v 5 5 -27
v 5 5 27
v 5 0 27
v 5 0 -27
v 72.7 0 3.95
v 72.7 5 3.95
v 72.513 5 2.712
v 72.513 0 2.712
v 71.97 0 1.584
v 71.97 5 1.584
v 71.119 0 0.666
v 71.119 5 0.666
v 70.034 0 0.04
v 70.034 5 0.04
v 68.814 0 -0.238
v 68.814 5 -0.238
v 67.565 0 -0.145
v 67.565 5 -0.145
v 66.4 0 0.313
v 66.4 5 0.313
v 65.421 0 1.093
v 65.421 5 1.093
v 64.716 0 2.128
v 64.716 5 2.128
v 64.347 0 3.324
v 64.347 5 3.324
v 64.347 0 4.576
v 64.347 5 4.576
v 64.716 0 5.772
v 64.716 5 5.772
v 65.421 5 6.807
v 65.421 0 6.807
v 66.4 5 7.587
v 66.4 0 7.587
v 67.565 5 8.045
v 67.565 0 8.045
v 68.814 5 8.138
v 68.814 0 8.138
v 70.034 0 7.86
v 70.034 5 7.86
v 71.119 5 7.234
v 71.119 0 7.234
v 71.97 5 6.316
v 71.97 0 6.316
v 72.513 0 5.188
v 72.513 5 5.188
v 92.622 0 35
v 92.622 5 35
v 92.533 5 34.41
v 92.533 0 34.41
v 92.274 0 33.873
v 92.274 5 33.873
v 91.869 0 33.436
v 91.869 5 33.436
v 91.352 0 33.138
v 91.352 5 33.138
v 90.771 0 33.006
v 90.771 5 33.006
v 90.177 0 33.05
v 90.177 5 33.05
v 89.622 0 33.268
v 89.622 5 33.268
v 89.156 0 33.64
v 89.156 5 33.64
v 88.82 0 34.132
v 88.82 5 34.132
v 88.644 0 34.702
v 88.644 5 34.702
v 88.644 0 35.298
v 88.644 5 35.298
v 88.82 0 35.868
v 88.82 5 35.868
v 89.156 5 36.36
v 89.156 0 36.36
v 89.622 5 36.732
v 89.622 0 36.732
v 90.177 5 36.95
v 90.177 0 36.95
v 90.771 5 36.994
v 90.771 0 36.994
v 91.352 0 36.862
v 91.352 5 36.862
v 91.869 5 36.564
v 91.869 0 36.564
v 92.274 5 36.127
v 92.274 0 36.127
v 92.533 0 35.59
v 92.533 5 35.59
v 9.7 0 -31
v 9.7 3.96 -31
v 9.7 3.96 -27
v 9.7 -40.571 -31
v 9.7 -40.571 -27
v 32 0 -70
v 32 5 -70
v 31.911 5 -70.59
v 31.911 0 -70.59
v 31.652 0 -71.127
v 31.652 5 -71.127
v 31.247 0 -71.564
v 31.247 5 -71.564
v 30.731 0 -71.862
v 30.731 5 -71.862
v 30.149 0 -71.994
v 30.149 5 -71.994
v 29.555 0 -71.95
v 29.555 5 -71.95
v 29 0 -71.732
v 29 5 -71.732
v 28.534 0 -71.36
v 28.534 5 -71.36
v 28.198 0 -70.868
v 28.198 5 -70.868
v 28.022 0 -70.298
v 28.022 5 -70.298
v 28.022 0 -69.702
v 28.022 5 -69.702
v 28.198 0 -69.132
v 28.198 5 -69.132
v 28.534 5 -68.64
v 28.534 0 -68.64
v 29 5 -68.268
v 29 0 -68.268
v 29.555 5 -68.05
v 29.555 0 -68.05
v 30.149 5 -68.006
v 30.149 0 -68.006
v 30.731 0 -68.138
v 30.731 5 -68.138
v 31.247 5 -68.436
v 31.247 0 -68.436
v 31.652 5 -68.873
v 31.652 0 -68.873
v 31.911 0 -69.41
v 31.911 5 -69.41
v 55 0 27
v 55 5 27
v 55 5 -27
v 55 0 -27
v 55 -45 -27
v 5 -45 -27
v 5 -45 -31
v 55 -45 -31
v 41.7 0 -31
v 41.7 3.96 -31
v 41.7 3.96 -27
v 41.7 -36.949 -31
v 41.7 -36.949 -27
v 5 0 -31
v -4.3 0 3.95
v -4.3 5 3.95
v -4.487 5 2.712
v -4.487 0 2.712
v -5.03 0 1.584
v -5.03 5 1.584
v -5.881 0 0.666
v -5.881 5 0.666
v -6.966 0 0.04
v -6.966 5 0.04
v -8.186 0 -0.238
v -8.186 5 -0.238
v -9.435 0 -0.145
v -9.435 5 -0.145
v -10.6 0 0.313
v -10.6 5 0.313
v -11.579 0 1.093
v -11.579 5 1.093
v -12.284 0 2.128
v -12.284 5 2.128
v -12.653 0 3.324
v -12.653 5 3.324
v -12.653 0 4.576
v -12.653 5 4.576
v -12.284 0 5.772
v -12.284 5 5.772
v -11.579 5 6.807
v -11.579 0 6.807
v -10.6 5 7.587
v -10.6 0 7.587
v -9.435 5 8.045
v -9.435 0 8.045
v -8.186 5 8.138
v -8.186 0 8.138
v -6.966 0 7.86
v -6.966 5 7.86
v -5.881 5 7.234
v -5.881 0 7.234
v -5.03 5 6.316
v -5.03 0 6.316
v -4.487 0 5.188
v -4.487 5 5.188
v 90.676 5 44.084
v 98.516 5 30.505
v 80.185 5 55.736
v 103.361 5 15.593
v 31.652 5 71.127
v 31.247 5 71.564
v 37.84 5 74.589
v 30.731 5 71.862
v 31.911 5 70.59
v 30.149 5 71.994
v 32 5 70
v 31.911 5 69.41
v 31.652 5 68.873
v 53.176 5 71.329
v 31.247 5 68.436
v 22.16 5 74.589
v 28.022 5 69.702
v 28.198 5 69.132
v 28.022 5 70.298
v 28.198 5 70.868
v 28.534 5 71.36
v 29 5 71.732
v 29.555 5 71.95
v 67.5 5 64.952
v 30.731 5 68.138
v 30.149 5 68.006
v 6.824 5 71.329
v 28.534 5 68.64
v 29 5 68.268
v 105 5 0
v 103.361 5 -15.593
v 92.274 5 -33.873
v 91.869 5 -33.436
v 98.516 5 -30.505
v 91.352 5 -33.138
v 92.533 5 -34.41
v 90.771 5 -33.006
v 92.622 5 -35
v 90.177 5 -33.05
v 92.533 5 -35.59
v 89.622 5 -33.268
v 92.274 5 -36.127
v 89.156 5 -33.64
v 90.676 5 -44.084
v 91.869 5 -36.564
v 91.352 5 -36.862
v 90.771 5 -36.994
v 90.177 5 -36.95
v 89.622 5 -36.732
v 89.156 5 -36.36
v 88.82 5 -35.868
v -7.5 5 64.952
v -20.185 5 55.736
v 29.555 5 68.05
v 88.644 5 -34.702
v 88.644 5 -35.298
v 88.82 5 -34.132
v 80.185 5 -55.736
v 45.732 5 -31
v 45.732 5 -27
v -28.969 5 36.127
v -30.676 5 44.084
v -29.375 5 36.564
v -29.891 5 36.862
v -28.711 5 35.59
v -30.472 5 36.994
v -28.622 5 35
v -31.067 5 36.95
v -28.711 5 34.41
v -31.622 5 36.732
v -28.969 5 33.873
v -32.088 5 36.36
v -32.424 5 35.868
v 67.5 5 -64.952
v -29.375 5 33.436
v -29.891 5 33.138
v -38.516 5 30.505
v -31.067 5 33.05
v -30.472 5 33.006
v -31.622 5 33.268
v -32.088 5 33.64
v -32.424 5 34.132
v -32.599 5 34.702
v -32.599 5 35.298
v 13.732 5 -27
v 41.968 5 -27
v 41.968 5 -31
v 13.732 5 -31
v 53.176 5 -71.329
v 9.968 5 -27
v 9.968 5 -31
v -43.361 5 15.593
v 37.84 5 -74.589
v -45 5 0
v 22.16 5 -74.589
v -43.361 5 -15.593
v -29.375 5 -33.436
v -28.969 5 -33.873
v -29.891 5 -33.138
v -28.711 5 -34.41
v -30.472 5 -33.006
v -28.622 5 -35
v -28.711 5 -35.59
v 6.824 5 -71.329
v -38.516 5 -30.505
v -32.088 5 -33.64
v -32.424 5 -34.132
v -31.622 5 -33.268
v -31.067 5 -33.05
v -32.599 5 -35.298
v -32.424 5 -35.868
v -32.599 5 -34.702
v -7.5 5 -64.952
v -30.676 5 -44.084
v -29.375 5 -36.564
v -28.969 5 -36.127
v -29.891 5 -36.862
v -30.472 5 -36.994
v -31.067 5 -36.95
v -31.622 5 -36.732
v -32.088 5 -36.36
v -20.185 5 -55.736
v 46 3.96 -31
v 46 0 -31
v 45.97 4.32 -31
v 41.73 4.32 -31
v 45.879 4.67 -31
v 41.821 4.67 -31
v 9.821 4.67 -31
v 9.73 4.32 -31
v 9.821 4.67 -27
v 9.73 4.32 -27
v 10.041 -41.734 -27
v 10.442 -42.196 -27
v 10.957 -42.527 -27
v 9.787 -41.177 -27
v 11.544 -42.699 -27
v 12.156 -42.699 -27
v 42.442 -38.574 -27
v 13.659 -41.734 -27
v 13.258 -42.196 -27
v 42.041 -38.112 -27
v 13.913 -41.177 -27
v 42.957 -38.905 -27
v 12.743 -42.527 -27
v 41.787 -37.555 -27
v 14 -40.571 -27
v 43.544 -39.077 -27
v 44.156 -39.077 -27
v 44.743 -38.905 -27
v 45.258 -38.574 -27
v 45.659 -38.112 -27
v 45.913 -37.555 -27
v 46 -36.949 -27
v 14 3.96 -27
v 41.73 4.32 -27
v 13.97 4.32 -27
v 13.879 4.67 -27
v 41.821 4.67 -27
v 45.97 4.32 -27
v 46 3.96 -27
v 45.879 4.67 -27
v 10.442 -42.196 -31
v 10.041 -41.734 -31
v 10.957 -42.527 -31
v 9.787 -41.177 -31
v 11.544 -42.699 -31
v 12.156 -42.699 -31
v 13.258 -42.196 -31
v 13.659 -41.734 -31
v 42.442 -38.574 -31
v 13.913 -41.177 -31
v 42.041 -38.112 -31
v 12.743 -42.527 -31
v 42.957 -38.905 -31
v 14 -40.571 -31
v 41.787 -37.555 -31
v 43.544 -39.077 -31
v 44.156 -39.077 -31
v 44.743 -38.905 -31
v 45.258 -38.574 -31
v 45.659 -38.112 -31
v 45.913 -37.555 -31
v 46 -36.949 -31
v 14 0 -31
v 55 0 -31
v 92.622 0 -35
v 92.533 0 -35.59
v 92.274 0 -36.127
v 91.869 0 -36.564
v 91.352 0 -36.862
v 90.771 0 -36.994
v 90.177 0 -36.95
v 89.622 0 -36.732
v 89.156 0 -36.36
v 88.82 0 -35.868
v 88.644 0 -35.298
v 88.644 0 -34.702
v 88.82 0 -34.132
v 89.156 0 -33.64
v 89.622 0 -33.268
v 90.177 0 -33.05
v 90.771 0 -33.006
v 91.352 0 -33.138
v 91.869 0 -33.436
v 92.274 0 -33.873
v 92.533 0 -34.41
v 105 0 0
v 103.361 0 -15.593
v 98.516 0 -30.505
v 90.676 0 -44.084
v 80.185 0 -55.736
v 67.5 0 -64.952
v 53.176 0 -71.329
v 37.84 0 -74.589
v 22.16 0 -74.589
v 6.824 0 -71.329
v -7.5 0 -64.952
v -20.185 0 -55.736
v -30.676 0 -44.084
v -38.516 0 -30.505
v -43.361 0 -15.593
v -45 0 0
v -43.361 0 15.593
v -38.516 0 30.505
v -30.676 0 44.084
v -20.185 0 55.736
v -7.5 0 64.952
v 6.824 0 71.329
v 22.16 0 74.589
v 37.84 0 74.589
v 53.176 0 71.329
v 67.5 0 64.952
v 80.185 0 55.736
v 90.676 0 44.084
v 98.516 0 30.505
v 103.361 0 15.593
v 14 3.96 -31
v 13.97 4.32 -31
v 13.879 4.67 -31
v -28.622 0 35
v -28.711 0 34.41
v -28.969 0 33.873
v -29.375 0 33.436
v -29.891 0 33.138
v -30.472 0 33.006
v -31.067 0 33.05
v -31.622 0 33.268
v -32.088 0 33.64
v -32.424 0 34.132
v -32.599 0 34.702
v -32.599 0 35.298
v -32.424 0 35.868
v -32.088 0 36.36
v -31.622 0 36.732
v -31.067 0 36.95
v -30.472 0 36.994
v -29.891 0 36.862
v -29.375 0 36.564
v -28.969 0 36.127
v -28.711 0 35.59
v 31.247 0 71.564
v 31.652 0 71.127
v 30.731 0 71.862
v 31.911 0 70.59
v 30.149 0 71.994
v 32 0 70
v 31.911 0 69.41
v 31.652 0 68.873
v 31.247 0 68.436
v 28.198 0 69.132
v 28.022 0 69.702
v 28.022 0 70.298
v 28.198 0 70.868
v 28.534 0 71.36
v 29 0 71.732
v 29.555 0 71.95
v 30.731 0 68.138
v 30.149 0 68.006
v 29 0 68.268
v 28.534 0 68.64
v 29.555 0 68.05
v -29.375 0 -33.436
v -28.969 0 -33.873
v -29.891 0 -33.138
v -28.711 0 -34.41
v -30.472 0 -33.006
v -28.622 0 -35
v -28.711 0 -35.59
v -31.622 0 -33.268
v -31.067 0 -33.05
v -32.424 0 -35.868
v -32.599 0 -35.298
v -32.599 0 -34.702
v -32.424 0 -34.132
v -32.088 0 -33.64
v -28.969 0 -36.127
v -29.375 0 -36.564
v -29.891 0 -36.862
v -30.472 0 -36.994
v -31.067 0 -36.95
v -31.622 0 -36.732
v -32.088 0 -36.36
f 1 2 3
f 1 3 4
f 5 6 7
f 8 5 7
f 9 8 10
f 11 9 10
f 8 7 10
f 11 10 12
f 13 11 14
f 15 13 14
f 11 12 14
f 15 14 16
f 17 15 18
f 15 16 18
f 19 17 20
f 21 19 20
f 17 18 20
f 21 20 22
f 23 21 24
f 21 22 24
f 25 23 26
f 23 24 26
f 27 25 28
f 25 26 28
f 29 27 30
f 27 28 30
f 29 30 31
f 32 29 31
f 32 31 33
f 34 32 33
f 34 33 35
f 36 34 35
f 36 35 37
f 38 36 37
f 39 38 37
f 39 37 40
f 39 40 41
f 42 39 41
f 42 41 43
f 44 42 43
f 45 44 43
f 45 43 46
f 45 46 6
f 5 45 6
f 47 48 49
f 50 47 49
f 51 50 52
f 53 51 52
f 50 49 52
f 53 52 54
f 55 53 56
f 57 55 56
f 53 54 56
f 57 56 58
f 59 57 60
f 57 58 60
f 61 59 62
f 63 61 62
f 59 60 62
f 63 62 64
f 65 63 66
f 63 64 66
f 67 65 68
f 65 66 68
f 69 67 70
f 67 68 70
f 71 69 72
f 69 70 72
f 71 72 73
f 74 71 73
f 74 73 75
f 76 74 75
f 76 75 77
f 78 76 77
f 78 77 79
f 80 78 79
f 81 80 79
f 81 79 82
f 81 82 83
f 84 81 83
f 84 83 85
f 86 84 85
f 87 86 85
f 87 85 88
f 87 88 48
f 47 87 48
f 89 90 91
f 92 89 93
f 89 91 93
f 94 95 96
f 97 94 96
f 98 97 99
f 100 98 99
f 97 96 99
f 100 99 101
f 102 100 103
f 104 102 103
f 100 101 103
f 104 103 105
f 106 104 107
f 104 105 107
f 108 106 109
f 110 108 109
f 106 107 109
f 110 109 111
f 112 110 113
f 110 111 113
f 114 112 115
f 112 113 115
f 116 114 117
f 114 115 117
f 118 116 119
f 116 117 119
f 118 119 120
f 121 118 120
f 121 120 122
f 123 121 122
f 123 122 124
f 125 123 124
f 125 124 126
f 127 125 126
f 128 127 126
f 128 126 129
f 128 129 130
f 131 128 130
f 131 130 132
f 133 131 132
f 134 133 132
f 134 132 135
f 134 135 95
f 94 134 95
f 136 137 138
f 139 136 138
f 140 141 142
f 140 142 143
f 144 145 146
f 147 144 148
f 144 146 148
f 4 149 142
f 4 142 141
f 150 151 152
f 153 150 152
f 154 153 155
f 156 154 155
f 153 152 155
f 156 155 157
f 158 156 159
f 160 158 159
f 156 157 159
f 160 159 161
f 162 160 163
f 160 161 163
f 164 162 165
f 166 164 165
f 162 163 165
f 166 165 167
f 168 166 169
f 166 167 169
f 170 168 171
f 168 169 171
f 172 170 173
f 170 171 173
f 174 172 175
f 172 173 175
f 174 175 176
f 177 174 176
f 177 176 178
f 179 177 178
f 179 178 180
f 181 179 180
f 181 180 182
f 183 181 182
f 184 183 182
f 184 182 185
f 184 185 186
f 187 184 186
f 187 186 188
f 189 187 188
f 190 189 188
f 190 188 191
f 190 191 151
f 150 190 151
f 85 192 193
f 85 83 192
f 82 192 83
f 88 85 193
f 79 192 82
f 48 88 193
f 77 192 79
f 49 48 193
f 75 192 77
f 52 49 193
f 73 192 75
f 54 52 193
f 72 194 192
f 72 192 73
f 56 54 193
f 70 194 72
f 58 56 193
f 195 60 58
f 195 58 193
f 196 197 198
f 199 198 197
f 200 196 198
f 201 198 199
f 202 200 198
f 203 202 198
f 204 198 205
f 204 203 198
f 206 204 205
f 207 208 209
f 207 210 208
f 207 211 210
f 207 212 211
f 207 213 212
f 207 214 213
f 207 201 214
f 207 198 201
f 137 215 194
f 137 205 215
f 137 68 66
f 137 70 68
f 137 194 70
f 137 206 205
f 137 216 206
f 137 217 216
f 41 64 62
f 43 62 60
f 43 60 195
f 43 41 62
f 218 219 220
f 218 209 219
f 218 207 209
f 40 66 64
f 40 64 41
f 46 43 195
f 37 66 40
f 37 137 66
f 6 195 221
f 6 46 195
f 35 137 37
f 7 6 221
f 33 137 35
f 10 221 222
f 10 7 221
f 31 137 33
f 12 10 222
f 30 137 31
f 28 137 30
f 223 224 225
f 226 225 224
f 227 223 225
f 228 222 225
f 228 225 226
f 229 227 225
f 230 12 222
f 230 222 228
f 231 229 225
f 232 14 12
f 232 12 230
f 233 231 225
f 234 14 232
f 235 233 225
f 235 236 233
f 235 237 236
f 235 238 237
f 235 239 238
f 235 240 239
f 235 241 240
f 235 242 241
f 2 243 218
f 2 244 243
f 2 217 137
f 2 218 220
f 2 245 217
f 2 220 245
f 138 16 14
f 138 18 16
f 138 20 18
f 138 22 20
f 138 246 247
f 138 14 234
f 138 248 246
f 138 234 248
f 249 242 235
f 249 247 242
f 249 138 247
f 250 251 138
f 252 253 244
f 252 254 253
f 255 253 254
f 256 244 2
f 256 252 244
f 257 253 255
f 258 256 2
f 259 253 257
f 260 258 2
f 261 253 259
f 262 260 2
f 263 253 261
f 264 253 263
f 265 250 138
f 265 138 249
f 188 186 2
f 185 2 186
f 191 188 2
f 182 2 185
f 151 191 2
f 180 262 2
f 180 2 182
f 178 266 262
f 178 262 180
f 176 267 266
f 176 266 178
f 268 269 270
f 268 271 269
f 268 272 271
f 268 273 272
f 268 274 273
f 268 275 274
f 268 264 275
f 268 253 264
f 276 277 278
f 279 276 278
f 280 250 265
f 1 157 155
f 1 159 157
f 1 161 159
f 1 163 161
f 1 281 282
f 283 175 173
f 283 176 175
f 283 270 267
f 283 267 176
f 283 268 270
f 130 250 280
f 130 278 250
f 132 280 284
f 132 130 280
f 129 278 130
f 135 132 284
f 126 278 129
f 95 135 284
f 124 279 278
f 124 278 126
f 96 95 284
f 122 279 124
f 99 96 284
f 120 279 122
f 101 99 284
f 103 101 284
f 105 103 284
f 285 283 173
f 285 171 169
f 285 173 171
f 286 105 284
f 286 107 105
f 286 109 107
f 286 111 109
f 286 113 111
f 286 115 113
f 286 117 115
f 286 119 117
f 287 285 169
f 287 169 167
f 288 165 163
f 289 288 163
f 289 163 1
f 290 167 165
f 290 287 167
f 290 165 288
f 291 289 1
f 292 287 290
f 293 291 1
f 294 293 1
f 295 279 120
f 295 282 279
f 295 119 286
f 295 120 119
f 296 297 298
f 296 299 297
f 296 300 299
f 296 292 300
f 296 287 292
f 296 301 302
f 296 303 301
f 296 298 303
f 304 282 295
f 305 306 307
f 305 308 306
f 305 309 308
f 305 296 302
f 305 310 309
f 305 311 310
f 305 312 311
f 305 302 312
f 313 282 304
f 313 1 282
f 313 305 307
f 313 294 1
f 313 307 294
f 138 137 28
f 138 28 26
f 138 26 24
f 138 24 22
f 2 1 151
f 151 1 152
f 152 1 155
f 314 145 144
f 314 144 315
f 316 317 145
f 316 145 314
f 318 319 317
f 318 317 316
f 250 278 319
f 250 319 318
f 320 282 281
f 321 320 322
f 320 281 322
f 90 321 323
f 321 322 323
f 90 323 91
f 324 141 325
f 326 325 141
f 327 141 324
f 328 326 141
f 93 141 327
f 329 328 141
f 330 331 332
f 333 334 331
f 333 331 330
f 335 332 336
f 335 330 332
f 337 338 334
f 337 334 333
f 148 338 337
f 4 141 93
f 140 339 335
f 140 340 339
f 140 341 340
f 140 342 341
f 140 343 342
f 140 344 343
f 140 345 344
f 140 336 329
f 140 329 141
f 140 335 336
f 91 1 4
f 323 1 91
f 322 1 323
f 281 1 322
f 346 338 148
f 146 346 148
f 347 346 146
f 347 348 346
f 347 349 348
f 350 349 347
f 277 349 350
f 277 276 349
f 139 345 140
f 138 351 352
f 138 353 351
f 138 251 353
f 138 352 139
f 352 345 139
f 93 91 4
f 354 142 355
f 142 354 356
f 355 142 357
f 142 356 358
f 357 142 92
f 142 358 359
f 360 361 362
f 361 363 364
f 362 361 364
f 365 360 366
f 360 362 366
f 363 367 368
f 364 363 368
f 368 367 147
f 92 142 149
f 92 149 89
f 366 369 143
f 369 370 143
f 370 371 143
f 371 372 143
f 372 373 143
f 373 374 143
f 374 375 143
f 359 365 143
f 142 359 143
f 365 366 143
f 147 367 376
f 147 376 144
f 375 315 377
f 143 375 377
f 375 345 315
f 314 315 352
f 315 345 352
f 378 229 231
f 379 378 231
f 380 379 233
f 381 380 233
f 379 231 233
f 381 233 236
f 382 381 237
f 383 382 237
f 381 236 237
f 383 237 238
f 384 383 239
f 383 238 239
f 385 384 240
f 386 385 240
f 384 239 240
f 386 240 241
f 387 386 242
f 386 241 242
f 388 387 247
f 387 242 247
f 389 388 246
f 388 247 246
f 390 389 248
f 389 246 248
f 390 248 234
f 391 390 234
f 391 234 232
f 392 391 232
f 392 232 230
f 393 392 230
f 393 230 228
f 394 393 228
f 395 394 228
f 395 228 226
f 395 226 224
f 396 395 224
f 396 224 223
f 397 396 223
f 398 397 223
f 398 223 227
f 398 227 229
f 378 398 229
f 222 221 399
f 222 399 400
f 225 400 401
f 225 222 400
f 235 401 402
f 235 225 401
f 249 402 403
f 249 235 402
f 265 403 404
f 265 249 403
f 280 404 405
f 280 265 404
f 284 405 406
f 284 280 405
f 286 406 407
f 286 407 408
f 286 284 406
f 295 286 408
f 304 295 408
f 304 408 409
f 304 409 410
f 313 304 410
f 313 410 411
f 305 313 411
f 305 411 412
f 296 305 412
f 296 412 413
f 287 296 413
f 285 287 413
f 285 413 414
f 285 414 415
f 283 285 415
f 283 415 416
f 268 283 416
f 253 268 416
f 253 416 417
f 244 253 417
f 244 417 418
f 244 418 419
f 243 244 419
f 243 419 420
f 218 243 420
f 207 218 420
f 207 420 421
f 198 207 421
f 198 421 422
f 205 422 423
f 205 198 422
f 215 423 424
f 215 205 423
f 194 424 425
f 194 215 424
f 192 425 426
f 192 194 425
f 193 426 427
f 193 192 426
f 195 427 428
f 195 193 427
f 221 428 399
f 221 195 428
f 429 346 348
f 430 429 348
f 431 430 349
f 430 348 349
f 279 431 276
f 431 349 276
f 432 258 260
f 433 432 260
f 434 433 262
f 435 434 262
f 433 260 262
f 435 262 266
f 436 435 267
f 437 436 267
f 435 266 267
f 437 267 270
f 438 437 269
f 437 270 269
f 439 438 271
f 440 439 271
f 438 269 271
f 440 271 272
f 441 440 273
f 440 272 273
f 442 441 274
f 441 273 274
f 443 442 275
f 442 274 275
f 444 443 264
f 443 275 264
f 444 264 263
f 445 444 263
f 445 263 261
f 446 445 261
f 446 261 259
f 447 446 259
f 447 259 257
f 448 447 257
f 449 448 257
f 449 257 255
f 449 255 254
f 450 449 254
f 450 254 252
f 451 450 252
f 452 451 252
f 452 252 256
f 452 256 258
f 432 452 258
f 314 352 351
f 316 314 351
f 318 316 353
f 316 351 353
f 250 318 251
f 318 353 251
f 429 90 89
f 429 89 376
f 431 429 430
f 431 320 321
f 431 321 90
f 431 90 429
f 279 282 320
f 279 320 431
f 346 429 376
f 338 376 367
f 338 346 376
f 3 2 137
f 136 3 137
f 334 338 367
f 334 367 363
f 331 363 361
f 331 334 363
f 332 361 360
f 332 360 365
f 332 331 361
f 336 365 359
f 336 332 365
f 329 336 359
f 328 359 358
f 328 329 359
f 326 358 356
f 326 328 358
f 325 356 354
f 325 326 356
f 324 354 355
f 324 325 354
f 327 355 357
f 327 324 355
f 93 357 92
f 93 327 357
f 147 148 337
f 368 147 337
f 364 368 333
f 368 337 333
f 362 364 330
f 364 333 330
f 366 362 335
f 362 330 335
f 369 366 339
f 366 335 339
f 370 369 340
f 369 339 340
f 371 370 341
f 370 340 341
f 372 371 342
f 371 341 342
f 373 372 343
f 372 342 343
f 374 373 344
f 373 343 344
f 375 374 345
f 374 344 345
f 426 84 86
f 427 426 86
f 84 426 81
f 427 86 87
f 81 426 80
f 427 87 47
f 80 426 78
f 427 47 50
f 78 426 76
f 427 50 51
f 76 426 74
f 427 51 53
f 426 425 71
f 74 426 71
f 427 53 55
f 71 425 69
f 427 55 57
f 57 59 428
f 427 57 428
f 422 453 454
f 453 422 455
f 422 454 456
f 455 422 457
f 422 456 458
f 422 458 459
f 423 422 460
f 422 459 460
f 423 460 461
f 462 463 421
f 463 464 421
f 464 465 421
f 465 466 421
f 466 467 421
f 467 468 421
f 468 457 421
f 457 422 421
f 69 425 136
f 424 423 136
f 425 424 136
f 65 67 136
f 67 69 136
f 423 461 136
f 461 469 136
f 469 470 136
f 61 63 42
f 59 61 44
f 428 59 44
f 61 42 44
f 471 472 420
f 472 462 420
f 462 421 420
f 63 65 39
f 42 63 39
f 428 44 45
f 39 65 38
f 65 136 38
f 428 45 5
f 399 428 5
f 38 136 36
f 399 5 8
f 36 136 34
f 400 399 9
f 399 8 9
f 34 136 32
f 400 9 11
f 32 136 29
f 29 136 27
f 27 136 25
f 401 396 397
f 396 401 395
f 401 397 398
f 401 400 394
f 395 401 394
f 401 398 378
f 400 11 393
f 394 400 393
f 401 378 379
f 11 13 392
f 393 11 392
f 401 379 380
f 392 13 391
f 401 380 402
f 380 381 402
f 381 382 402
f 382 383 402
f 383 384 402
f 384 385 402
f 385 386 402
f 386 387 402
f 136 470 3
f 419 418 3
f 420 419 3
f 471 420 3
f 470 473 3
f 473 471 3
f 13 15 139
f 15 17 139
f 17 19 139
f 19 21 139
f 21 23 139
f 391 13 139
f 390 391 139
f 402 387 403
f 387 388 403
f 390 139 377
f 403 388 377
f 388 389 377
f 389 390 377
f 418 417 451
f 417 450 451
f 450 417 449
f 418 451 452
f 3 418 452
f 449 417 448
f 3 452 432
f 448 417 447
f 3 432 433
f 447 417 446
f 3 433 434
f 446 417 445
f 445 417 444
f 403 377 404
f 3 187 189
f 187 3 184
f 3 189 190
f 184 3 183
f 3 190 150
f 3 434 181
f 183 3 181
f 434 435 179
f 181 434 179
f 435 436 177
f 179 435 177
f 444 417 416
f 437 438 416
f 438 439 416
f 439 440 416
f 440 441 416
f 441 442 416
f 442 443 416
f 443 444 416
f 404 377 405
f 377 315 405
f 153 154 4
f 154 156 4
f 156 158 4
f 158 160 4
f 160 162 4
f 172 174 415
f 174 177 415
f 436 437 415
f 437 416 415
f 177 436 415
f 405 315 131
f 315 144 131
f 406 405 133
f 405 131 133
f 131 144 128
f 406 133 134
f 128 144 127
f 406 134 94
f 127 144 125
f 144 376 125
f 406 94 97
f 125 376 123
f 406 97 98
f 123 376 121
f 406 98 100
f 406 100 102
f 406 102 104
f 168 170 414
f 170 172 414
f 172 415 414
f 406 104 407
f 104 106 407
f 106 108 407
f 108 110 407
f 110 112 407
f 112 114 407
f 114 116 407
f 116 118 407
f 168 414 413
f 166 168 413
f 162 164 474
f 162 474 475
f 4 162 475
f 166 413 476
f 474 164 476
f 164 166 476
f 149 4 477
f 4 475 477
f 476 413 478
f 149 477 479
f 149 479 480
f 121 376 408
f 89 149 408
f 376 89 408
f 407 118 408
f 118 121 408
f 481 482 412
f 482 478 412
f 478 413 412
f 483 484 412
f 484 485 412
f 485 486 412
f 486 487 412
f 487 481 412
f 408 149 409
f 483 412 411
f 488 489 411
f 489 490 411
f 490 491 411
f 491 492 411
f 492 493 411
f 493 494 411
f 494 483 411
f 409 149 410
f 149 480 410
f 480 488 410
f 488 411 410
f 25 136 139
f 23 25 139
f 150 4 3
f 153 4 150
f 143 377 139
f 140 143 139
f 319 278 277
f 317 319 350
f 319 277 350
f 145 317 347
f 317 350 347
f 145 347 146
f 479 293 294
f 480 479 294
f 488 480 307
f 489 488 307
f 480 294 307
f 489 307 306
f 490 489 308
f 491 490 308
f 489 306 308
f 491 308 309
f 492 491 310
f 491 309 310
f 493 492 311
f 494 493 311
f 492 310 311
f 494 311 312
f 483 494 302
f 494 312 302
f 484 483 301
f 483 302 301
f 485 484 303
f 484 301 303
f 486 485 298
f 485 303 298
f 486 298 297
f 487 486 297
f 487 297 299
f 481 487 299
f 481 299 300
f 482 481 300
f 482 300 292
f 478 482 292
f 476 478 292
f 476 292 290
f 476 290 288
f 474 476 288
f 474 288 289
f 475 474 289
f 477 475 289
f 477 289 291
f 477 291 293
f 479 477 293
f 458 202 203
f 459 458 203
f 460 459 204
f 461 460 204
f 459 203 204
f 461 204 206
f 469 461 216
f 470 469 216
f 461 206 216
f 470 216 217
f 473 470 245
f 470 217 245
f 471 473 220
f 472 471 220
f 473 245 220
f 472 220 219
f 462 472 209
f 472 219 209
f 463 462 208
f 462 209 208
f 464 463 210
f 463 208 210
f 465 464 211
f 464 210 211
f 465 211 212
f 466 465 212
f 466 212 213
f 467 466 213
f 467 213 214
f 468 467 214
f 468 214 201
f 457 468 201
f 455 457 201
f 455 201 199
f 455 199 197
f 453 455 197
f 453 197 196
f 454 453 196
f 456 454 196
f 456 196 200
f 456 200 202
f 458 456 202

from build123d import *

# Parameters (mm, degrees)
SKETCH1_W           = 200
SKETCH1_H           = 100
BOSS_EXTRUDE1_DEPTH = 5
SKETCH2_W           = 50
SKETCH2_H           = 54
CUT_EXTRUDE1_DEPTH  = 6
SKETCH3_W           = 50
SKETCH3_H           = 4
BOSS_EXTRUDE2_DEPTH = 45
CUT_EXTRUDE3_DEPTH  = 4
SKETCH19_W          = 200
SKETCH19_H          = 5
BOSS_EXTRUDE3_DEPTH = 25
SKETCH20_W          = 200
SKETCH20_H          = 5
BOSS_EXTRUDE4_DEPTH = 25
SKETCH21_W          = 150
SKETCH21_H          = 5
BOSS_EXTRUDE5_DEPTH = 25
SKETCH22_OUTSIDE_W  = 282
SKETCH22_OUTSIDE_H  = 207
SKETCH22_OUTSIDE_R  = 75
CUT_EXTRUDE6_DEPTH  = 51
SKETCH26_R          = 2
CUT_EXTRUDE7_DEPTH  = 51
CUT_EXTRUDE8_REACH  = 52
SKETCH28_R          = 4.2
CUT_EXTRUDE10_DEPTH = 4


with BuildPart() as part:
    # Sketch1 → Boss-Extrude1 (new body)
    with BuildSketch(Plane(origin=(0, 0, 0), x_dir=(1, 0, 0), z_dir=(0, 1, 0))):
        Rectangle(SKETCH1_W, SKETCH1_H)
    extrude(amount=BOSS_EXTRUDE1_DEPTH)

    # Sketch2 → Cut-Extrude1 (cut, through all)
    with BuildSketch(Plane(origin=(0, 5, 0), x_dir=(1, 0, 0), z_dir=(0, 1, 0))):
        with Locations((30, 0)):
            Rectangle(SKETCH2_W, SKETCH2_H)
    extrude(amount=-CUT_EXTRUDE1_DEPTH, mode=Mode.SUBTRACT)

    # Sketch3 → Boss-Extrude2 (add)
    with BuildSketch(Plane.XZ):
        with Locations((30, -29)):
            Rectangle(SKETCH3_W, SKETCH3_H)
    extrude(amount=BOSS_EXTRUDE2_DEPTH)

    # Sketch4 → Cut-Extrude3 (cut)
    with BuildSketch(Plane.XY.offset(-27)):
        with BuildLine():
            ThreePointArc((14, 3.960327286), (11.85, 6.110327286), (9.7, 3.960327286))
            Line((9.7, 3.960327286), (9.7, -6.197738793))
            Line((9.7, -6.197738793), (14, -6.197264156))
            Line((14, -6.197264156), (14, 3.960327286))
        make_face()
        with BuildLine():
            Line((41.7, 3.960327286), (41.7, -31.94922721))
            ThreePointArc((41.7, -31.94922721), (43.85, -34.09922721), (46, -31.94922721))
            Line((46, -31.94922721), (46, 3.960327286))
            ThreePointArc((46, 3.960327286), (43.85, 6.110327286), (41.7, 3.960327286))
        make_face()
    extrude(amount=-CUT_EXTRUDE3_DEPTH, mode=Mode.SUBTRACT)

    # Sketch19 → Boss-Extrude3 (add)
    with BuildSketch(Plane(origin=(0, 0, -50), x_dir=(-1, 0, 0), z_dir=(0, 0, -1))):
        with Locations((0, 2.5)):
            Rectangle(SKETCH19_W, SKETCH19_H)
    extrude(amount=BOSS_EXTRUDE3_DEPTH)

    # Sketch20 → Boss-Extrude4 (add)
    with BuildSketch(Plane.XY.offset(50)):
        with Locations((0, 2.5)):
            Rectangle(SKETCH20_W, SKETCH20_H)
    extrude(amount=BOSS_EXTRUDE4_DEPTH)

    # Sketch21 → Boss-Extrude5 (add)
    with BuildSketch(Plane(origin=(100, 0, 0), x_dir=(0, 0, -1), z_dir=(1, 0, 0))):
        with Locations((0, 2.5)):
            Rectangle(SKETCH21_W, SKETCH21_H)
    extrude(amount=BOSS_EXTRUDE5_DEPTH)

    # Sketch22 outside → Cut-Extrude6 (cut, through all)
    with BuildSketch(Plane(origin=(0, 5, 0), x_dir=(1, 0, 0), z_dir=(0, 1, 0))):
        with Locations((12.5, 0)):
            Rectangle(SKETCH22_OUTSIDE_W, SKETCH22_OUTSIDE_H)
        with Locations((30, 0)):
            Circle(SKETCH22_OUTSIDE_R, mode=Mode.SUBTRACT)
    extrude(amount=-CUT_EXTRUDE6_DEPTH, mode=Mode.SUBTRACT)

    # Sketch26 → Cut-Extrude7 (cut, through all)
    with BuildSketch(Plane(origin=(0, 5, 0), x_dir=(1, 0, 0), z_dir=(0, 1, 0))):
        with Locations((30, -70)):
            Circle(SKETCH26_R)
        with Locations((-30.621778265, -35)):
            Circle(SKETCH26_R)
        with Locations((-30.621778265, 35)):
            Circle(SKETCH26_R)
        with Locations((30, 70)):
            Circle(SKETCH26_R)
        with Locations((90.621778265, 35)):
            Circle(SKETCH26_R)
        with Locations((90.621778265, -35)):
            Circle(SKETCH26_R)
    extrude(amount=-CUT_EXTRUDE7_DEPTH, mode=Mode.SUBTRACT)

    # Sketch28 → Cut-Extrude8 (cut, up to next)
    with BuildSketch(Plane(origin=(0, 5, 0), x_dir=(1, 0, 0), z_dir=(0, 1, 0)), mode=Mode.PRIVATE) as cut_extrude8_sk1:
        with Locations((-8.5, -3.95)):
            Circle(SKETCH28_R)
    cut_extrude8_tool1 = extrude(cut_extrude8_sk1.sketch, amount=-CUT_EXTRUDE8_REACH, mode=Mode.PRIVATE) & part.part
    add(cut_extrude8_tool1.solids().sort_by_distance((-8.5, 5, 3.95))[0], mode=Mode.SUBTRACT)
    # Sketch28 → Cut-Extrude8 (cut, up to next)
    with BuildSketch(Plane(origin=(0, 5, 0), x_dir=(1, 0, 0), z_dir=(0, 1, 0)), mode=Mode.PRIVATE) as cut_extrude8_sk2:
        with Locations((68.5, -3.95)):
            Circle(SKETCH28_R)
    cut_extrude8_tool2 = extrude(cut_extrude8_sk2.sketch, amount=-CUT_EXTRUDE8_REACH, mode=Mode.PRIVATE) & part.part
    add(cut_extrude8_tool2.solids().sort_by_distance((68.5, 5, 3.95))[0], mode=Mode.SUBTRACT)

    # Sketch30 → Cut-Extrude10 (cut)
    with BuildSketch(Plane.XY.offset(-27)):
        with BuildLine():
            Line((14, -6.197264156), (14, -40.571371384))
            ThreePointArc((14, -40.571371384), (11.85, -42.721371384), (9.7, -40.571371384))
            Line((9.7, -40.571371384), (9.7, -6.197738793))
            Line((9.7, -6.197738793), (14, -6.197264156))
        make_face()
        with BuildLine():
            Line((41.7, -31.94922721), (41.7, -36.94922721))
            ThreePointArc((41.7, -36.94922721), (43.85, -39.09922721), (46, -36.94922721))
            Line((46, -36.94922721), (46, -31.94922721))
            Line((46, -31.94922721), (41.7, -31.94922721))
        make_face()
    extrude(amount=-CUT_EXTRUDE10_DEPTH, mode=Mode.SUBTRACT)


solid = part.part
